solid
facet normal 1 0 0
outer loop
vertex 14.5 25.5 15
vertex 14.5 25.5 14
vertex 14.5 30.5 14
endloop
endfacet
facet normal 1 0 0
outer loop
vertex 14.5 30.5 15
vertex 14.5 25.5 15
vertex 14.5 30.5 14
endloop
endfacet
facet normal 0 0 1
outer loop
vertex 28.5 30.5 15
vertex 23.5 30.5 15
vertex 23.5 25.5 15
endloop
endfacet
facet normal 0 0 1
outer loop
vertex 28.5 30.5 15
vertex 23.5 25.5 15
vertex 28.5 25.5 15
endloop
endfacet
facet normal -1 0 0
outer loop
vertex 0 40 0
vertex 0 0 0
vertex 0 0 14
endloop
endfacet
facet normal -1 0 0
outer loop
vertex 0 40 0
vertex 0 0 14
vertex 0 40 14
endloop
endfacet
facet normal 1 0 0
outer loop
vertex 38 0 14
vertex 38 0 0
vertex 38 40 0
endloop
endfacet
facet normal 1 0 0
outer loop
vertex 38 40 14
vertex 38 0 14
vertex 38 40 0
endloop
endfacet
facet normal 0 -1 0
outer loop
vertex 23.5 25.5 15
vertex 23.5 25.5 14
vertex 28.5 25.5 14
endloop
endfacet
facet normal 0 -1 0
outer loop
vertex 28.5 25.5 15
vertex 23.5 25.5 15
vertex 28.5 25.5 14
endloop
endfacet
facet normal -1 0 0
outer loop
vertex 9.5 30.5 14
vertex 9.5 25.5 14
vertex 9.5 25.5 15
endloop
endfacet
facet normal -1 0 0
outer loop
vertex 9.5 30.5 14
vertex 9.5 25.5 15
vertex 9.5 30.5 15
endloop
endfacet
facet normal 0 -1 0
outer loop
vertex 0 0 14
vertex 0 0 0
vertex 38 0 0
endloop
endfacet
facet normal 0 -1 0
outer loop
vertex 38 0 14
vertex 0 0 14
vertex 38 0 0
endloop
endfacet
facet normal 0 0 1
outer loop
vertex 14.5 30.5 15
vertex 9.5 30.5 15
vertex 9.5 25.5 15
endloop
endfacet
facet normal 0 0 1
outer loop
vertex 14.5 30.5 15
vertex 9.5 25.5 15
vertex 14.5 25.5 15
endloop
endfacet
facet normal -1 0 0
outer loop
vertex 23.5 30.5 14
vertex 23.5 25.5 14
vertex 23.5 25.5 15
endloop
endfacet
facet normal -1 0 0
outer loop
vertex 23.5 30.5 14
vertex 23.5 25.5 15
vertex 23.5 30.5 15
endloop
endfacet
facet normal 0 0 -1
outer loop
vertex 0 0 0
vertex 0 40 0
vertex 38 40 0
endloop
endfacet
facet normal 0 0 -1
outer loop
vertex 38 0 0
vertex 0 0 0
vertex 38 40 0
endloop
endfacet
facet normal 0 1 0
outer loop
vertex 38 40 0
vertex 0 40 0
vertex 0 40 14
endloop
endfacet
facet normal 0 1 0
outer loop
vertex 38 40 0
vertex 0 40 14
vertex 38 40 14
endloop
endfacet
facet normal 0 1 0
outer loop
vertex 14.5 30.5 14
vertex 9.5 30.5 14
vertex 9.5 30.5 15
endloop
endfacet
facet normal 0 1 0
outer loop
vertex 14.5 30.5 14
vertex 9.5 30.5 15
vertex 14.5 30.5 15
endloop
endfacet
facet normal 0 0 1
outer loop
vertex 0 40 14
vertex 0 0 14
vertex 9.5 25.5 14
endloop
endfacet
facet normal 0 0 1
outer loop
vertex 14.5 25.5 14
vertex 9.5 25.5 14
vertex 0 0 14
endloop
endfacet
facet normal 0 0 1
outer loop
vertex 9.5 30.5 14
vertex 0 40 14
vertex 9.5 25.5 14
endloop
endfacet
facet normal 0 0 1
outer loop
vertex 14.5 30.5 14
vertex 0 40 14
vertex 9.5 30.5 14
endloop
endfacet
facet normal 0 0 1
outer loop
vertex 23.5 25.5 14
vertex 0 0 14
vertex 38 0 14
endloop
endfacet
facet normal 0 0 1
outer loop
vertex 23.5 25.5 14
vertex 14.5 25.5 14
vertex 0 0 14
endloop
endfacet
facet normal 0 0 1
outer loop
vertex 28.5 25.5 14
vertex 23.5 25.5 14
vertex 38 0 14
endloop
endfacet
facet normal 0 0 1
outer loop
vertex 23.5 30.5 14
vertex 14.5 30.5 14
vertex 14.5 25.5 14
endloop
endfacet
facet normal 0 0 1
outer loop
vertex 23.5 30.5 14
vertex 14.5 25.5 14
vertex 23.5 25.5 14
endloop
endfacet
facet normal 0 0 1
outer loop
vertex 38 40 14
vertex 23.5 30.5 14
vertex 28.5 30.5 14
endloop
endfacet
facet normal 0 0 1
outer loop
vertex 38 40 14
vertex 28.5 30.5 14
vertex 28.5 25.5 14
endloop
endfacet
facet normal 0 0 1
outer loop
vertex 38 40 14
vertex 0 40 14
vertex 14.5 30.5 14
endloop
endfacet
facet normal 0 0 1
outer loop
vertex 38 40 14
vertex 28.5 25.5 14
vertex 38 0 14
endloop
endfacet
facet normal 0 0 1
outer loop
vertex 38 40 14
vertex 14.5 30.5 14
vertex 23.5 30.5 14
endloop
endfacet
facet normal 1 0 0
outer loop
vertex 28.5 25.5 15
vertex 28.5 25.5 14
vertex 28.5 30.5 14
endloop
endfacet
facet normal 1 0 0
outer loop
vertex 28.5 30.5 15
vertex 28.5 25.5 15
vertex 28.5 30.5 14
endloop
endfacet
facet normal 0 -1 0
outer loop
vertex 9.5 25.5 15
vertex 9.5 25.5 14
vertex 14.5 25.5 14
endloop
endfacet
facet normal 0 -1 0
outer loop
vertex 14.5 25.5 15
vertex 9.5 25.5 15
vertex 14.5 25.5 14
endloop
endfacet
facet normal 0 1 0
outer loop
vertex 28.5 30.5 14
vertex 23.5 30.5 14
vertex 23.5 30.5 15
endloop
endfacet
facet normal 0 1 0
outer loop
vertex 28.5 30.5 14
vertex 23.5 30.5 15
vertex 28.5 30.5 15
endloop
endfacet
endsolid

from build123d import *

# Parameters (mm, degrees)
SKETCH_1_W      = 38
SKETCH_1_H      = 40
EXTRUDE_1_DEPTH = 14
SKETCH_2_W      = 5
SKETCH_2_H      = 5
EXTRUDE_2_DEPTH = 1


with BuildPart() as part:
    # 草图1 → 凸台-拉伸1 (new body)
    with BuildSketch(Plane.XY):
        with Locations((19, 20)):
            Rectangle(SKETCH_1_W, SKETCH_1_H)
    extrude(amount=EXTRUDE_1_DEPTH)

    # 草图2 → 凸台-拉伸2 (add)
    with BuildSketch(Plane.XY.offset(14)):
        with Locations((26, 28)):
            Rectangle(SKETCH_2_W, SKETCH_2_H)
        with Locations((12, 28)):
            Rectangle(SKETCH_2_W, SKETCH_2_H)
    extrude(amount=EXTRUDE_2_DEPTH)


solid = part.part
